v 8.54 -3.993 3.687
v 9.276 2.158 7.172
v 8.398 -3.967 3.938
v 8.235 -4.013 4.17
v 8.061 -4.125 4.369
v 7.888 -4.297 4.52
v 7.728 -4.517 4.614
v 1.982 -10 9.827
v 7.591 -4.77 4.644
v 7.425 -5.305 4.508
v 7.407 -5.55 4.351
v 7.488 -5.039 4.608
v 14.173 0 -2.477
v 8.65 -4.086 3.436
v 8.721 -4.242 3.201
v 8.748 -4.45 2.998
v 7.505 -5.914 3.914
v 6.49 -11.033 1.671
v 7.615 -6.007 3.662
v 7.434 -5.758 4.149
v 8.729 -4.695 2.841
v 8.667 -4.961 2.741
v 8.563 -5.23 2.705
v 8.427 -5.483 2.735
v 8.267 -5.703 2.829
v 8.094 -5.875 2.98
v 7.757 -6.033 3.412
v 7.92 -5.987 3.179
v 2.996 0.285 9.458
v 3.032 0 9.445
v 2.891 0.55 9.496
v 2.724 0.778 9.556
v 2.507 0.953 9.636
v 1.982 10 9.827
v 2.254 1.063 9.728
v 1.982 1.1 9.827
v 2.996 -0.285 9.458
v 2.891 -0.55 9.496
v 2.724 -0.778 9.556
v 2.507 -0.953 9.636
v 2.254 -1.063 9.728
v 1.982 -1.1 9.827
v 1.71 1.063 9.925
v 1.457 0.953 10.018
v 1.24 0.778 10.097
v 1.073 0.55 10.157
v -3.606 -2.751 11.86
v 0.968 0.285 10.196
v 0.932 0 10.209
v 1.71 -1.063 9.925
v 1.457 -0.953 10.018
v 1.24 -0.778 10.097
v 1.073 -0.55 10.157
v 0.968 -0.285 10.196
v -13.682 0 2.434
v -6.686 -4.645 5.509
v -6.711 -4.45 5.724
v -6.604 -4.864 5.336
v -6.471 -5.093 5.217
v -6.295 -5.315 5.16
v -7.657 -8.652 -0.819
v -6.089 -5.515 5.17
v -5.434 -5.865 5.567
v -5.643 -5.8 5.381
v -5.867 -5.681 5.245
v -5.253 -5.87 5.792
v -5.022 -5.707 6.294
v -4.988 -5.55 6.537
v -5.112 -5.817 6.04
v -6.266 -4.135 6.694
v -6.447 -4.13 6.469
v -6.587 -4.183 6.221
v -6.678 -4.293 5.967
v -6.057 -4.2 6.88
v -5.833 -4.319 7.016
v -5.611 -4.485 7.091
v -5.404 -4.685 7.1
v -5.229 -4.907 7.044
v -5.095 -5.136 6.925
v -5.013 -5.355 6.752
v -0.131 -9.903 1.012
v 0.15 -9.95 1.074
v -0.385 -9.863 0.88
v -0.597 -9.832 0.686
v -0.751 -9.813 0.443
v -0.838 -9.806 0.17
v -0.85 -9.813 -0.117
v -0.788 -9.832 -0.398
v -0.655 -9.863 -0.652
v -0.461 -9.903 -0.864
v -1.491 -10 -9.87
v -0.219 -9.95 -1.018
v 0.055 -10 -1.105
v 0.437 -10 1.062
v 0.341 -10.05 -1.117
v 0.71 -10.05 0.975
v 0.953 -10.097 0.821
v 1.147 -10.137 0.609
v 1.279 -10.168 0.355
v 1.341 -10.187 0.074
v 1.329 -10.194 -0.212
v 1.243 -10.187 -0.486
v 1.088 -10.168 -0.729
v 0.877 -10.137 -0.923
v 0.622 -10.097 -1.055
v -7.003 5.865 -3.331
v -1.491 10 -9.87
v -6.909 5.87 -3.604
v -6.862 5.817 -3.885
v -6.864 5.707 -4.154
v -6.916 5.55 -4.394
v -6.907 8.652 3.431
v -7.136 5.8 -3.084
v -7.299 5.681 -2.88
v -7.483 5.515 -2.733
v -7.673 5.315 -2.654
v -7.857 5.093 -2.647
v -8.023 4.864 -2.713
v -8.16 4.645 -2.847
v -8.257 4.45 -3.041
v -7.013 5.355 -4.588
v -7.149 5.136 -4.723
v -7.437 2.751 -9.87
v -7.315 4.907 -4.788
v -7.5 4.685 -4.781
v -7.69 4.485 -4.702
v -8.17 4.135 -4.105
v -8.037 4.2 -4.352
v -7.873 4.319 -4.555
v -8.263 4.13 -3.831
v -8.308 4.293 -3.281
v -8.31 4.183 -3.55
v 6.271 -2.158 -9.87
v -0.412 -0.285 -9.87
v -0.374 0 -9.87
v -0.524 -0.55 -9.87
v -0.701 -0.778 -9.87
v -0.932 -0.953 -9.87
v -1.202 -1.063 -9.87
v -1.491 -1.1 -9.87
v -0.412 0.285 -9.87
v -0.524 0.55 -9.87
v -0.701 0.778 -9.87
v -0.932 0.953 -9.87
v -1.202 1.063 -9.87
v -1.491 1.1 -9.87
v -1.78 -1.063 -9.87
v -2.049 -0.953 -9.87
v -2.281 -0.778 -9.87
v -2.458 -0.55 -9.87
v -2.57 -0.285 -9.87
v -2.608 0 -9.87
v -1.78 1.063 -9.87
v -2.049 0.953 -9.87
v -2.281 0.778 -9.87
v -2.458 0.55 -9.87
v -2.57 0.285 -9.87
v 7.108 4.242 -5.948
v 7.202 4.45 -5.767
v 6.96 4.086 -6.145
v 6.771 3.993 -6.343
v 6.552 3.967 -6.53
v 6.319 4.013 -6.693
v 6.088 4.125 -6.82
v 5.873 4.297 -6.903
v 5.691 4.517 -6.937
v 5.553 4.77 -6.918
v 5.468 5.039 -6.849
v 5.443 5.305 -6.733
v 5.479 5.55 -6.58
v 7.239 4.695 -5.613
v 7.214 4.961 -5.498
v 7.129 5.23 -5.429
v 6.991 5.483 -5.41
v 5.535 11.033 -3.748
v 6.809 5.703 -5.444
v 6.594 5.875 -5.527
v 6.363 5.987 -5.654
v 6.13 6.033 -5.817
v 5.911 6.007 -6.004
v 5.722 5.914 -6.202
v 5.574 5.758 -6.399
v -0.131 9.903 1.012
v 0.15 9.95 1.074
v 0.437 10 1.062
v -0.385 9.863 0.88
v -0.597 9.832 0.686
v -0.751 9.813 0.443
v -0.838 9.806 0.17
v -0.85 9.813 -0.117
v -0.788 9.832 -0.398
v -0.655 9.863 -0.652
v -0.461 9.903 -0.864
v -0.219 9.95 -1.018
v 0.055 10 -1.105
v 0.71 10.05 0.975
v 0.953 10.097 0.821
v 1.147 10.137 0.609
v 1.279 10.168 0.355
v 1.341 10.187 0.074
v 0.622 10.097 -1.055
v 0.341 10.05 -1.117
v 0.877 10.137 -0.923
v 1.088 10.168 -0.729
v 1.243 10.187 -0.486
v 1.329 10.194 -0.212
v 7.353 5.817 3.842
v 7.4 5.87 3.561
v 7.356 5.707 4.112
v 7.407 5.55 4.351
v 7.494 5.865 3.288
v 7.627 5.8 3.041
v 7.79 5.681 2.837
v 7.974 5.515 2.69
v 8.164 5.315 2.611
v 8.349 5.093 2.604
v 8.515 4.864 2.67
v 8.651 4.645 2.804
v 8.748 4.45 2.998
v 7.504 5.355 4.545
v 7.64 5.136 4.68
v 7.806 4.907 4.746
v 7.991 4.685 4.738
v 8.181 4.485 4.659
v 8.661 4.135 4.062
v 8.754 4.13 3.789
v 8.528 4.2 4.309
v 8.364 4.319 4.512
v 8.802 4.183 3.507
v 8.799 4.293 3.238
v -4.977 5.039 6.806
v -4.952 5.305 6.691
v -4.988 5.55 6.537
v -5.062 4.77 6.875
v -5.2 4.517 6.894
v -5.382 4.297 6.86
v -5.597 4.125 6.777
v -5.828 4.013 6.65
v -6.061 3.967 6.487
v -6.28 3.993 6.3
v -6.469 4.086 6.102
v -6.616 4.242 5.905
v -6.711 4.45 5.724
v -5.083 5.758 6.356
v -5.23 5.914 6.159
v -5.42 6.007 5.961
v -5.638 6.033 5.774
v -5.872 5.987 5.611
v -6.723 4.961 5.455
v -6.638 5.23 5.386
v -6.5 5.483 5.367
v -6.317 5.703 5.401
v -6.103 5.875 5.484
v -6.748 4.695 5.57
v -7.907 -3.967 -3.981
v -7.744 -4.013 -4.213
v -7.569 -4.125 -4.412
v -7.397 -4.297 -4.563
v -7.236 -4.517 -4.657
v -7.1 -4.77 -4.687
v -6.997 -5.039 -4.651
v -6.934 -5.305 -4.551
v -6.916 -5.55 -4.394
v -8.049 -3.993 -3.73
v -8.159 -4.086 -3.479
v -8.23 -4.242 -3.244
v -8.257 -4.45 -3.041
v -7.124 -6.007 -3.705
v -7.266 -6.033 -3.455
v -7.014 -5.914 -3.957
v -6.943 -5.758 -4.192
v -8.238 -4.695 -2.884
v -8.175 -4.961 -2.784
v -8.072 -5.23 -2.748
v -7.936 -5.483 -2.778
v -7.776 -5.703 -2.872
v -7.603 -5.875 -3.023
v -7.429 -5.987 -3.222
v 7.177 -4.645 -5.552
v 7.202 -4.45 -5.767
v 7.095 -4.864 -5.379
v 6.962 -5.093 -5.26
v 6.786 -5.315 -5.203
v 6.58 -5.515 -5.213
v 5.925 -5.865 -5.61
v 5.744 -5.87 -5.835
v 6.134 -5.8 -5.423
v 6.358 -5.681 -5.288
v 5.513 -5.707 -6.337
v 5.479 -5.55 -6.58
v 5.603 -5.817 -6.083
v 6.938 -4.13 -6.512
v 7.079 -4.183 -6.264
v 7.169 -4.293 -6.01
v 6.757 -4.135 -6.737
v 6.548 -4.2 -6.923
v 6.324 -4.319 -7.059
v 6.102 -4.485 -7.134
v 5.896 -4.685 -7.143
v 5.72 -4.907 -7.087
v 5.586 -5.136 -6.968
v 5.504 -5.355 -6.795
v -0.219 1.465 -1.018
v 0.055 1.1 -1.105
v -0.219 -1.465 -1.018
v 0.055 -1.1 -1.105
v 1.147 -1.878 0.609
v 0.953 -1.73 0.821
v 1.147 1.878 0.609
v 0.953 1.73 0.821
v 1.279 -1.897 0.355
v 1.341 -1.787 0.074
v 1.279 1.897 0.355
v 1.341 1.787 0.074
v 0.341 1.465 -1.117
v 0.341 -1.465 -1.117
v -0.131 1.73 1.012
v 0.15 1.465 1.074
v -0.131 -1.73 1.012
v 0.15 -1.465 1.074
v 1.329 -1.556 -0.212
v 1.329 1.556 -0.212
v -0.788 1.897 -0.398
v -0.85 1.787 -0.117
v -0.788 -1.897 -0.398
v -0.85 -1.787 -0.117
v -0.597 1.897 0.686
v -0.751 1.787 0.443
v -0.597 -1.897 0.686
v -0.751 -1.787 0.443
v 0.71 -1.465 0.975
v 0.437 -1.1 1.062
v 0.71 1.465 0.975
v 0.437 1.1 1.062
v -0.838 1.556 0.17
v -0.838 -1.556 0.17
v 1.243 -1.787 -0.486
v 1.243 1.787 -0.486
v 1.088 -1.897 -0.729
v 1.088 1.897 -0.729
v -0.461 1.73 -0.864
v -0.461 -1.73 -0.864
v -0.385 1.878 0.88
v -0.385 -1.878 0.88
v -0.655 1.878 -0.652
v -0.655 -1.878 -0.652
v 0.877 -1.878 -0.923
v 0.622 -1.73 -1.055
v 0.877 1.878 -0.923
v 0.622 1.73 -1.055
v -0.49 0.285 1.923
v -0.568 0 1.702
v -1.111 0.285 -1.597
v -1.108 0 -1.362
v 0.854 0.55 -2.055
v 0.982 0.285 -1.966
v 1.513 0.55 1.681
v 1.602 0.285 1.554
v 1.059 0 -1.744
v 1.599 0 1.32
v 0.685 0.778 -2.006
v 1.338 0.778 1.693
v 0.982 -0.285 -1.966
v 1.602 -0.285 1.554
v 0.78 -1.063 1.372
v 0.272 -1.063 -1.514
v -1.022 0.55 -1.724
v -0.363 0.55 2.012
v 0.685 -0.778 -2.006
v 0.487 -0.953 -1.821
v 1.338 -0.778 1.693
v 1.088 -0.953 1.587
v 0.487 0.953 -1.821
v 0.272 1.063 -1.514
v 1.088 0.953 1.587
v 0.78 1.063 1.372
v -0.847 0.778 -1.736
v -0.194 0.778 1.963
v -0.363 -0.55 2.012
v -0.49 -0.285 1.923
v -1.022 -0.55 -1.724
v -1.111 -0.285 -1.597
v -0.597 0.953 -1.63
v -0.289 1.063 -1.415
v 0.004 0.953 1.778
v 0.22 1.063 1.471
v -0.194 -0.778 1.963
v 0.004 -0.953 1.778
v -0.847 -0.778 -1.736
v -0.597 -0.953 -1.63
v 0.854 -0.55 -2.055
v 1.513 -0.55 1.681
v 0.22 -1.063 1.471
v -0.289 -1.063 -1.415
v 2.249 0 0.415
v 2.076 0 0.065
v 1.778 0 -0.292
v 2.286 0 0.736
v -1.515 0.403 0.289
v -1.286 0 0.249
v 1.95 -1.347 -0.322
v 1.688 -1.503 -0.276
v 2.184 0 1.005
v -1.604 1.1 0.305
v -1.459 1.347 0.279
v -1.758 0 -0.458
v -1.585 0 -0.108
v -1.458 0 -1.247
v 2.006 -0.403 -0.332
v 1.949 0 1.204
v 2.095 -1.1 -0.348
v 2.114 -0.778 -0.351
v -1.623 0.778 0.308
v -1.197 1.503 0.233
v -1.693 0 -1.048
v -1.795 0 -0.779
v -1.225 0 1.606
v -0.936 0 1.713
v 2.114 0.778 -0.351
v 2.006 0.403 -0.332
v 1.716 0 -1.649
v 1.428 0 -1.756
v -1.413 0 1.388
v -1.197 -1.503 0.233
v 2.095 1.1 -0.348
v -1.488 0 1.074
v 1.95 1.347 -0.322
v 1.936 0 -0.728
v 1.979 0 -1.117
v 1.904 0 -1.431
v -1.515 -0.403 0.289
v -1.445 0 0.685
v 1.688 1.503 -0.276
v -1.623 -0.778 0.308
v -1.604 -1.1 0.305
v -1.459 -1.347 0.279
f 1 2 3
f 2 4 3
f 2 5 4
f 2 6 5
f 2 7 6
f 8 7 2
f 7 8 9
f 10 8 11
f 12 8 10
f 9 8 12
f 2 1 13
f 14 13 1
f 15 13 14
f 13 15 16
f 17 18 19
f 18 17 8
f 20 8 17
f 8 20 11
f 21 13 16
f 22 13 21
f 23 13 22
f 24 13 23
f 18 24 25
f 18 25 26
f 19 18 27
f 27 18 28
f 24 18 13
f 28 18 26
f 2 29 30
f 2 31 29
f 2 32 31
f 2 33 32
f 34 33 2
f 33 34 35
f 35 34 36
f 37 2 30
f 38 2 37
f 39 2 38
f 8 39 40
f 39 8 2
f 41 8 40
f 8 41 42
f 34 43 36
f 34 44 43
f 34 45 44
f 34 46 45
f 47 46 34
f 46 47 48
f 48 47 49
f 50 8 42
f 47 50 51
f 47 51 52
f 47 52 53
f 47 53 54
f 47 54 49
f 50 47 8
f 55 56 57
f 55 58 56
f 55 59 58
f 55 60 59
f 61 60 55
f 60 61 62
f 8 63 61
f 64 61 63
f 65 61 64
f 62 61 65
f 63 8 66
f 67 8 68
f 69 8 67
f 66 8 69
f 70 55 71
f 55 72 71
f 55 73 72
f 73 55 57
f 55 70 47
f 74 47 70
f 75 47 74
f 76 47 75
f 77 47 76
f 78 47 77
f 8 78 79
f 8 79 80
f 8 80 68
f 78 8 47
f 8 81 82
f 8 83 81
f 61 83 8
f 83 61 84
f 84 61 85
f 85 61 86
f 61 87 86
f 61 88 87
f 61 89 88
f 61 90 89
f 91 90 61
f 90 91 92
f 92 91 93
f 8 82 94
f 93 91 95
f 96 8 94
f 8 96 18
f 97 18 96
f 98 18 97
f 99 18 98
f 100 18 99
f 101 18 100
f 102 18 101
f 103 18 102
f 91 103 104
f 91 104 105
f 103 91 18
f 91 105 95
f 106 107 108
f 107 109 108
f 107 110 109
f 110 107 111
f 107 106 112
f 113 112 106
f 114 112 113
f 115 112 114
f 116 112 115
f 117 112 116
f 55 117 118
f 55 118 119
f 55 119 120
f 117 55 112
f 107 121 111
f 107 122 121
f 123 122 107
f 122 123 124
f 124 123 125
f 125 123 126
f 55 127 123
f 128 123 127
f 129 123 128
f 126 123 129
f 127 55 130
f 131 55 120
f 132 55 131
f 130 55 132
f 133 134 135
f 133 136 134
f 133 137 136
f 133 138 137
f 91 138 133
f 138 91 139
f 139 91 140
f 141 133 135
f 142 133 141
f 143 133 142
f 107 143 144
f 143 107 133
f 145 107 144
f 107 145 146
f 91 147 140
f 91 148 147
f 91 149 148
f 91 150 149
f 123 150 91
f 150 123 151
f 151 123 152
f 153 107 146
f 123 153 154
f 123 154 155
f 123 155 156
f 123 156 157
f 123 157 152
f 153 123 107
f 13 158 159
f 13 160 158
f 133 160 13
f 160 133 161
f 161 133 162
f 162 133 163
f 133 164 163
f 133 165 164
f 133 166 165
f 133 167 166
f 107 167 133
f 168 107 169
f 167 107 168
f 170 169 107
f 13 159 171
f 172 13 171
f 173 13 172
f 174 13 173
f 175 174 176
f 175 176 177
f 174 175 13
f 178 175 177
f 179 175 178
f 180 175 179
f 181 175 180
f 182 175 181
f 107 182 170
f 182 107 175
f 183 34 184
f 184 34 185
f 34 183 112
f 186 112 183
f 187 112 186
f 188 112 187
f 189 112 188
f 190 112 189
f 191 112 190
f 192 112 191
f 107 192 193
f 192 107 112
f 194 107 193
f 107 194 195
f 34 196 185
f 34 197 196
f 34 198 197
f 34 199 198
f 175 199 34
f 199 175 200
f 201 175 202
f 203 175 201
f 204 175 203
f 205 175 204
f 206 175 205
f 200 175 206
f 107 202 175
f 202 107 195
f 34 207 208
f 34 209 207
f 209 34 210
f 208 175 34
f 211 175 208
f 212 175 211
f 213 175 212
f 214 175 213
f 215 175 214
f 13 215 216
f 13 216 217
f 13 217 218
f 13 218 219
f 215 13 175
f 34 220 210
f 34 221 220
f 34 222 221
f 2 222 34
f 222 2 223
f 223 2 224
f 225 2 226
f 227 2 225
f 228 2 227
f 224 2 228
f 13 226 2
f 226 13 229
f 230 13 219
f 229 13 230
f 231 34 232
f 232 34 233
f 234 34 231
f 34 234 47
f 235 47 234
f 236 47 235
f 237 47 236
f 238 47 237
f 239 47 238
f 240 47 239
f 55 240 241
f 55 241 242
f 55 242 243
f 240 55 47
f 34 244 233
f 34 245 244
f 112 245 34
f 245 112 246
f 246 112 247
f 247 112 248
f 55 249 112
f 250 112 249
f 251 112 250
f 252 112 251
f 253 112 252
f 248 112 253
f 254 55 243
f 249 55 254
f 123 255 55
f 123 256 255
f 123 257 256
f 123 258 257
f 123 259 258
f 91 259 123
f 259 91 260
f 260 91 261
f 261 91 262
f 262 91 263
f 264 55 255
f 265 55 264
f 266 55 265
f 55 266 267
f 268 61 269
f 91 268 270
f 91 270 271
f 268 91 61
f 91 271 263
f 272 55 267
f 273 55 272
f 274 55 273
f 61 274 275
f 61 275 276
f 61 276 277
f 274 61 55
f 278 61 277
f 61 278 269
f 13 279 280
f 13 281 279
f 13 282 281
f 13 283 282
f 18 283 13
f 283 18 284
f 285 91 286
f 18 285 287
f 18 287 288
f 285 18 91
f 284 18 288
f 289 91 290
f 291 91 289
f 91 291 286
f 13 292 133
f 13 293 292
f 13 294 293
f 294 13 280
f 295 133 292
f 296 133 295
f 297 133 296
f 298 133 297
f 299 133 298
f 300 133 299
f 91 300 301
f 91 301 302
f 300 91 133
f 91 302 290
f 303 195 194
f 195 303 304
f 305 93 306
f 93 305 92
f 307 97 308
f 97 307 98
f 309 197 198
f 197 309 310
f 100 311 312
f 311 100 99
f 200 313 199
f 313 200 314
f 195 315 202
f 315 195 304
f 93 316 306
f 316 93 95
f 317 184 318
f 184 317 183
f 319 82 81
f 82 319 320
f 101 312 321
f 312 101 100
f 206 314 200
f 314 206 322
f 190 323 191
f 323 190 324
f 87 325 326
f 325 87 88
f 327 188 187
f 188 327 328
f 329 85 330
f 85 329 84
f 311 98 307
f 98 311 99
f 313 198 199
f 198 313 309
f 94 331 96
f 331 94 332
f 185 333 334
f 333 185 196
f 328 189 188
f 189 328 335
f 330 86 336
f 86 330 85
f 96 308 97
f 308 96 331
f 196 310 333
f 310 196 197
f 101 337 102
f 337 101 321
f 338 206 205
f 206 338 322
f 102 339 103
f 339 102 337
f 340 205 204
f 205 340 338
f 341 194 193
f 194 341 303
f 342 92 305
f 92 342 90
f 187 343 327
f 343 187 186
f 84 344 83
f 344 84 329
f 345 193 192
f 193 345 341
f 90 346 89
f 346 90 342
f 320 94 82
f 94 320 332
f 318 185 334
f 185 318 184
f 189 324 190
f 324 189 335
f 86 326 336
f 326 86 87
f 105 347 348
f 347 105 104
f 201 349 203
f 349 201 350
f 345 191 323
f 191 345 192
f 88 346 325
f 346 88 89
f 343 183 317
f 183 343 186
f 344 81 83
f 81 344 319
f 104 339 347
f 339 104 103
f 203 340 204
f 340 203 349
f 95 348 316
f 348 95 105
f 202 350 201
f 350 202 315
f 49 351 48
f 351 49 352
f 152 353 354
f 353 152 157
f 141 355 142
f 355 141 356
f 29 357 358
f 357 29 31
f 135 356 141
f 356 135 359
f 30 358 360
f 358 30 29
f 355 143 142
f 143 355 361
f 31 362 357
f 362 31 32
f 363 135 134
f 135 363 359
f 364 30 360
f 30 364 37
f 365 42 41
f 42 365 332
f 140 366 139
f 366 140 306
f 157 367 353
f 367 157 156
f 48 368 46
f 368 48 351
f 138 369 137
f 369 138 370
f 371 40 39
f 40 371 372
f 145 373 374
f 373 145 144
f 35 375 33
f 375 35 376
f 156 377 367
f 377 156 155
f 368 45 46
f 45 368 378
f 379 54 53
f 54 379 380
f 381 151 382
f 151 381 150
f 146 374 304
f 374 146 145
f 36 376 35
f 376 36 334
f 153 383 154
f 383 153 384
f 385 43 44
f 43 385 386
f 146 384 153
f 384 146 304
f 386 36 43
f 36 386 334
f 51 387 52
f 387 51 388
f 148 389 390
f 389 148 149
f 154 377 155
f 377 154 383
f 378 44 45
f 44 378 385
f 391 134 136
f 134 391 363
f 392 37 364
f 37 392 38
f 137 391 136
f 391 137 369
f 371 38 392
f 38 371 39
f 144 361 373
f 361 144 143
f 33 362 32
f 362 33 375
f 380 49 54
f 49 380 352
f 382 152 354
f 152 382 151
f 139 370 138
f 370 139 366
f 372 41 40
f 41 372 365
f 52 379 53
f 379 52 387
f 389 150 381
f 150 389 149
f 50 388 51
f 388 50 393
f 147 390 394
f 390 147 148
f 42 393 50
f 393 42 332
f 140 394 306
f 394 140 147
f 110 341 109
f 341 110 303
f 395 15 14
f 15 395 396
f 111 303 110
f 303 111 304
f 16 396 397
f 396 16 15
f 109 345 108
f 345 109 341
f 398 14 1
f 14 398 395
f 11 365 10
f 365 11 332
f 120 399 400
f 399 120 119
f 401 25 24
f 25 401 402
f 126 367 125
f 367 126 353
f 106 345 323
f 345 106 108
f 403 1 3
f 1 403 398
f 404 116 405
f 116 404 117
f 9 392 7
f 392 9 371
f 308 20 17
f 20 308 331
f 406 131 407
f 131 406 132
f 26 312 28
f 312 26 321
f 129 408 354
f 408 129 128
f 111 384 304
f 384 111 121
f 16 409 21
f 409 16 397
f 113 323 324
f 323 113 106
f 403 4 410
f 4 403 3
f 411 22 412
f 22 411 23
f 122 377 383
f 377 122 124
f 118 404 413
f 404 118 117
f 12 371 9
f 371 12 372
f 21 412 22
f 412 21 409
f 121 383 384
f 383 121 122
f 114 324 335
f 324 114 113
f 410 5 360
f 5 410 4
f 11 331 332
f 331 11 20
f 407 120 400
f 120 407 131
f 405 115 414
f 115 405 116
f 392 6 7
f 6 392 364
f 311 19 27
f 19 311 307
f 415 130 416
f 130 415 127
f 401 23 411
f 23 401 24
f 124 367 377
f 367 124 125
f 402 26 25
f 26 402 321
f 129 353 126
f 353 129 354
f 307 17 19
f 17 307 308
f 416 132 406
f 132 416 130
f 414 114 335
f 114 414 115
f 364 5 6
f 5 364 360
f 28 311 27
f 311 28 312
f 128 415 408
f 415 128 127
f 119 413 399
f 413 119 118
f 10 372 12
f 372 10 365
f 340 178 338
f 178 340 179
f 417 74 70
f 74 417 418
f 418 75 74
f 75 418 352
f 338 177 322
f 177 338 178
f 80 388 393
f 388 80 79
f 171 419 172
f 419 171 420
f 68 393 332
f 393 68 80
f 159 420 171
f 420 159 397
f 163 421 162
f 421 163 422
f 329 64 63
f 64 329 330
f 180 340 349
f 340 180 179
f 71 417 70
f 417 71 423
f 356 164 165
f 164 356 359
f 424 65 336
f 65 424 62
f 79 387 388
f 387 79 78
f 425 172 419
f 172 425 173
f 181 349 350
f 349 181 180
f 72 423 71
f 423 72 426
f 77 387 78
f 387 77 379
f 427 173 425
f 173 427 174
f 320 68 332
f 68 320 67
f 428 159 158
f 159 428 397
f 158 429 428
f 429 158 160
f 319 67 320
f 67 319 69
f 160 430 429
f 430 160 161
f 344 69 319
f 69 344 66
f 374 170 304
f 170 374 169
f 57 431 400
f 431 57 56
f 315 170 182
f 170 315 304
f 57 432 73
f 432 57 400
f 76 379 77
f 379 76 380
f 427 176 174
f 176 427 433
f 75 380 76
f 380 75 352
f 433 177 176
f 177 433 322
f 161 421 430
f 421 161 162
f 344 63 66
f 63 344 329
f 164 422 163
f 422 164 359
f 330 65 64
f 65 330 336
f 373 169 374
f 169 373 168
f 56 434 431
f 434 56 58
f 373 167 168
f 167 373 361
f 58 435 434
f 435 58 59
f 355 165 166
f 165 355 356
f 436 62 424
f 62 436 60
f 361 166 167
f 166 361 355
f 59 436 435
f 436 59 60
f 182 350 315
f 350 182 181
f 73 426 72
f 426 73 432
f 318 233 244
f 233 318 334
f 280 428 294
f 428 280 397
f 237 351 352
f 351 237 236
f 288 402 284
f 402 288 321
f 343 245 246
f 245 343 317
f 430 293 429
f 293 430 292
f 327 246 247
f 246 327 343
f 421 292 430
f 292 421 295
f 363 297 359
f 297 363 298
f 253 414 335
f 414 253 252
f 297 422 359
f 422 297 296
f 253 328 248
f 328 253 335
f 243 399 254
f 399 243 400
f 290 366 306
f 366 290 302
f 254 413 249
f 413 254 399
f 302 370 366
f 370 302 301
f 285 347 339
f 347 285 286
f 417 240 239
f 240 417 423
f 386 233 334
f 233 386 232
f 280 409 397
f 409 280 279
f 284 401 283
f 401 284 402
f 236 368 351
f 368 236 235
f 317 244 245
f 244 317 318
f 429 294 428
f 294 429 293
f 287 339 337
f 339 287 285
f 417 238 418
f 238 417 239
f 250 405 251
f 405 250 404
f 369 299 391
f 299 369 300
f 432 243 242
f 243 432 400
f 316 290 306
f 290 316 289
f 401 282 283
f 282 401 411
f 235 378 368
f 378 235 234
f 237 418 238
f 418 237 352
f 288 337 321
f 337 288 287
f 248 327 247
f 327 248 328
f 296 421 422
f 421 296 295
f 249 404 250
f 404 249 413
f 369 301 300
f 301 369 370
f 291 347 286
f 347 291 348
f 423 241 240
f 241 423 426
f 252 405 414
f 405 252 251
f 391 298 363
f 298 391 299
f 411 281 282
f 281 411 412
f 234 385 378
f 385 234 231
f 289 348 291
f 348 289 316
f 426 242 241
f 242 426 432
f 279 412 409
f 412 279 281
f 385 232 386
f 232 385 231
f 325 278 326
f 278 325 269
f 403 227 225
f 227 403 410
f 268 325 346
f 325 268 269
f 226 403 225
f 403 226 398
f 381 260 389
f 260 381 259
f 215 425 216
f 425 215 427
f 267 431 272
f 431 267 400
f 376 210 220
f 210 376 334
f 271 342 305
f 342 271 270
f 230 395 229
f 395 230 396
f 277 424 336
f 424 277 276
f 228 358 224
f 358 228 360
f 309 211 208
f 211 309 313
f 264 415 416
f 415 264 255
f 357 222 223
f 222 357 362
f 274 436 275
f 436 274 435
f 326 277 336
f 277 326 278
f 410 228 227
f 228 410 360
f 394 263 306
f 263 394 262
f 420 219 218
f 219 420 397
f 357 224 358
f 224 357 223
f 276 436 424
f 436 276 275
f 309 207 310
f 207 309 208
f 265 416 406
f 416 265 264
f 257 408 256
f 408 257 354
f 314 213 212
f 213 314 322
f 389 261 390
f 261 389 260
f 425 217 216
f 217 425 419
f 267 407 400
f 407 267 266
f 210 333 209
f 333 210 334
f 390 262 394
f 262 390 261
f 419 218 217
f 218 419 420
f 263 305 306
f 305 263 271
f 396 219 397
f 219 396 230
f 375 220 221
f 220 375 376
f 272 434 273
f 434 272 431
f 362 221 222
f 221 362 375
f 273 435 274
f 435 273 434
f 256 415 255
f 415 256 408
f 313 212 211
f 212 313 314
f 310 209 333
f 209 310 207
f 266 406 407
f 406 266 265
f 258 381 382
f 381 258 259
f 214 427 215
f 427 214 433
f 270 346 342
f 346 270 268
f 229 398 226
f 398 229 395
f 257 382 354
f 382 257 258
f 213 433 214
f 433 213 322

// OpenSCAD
//Шаг сетки для решётки из ромбододекаэдров (межцентровое расстояние)
MM_GRID_STEP = 20.0;

//диаметр отвертия (диаметр описанной окружности около многоугольника детализации)
//если диаметр = 0, то отверстий нет, 2.2 = диаметр зубочистки
MM_HOLE_DIAMETER = 2.2;

//true либо false параметр, показывающия исходный ромбододекаэдр без скоса
//для подсветки и разработки делай true, для 3Д-печати делай false
WILL_SHOW_CORE = false;

//показывать цвета
WILL_SHOW_COLOR = true;

//длина укороченной чёрной стороны (когда 1 - ось поворта по короткой диагонали)
//ось поворота - это граница цветов 
//синее море внизу и белое небо сверху на видео от Певницкого 15 мая
CUT_RATIO = 1;
//синее море внизу и белое небо сверху, если угол положительный
CUT_DEGREE = 10;

//такой n-угольник для детализации отверстия
HOLE_DETALISATION_IS_N_POLYGON = 24;


CUBE_SIDE = MM_GRID_STEP / sqrt(2);

//тетраэдр по четырём точкам, точка номер ноль - вершина
module m_tetrahedron(p4) {
    polyhedron(points=p4, faces=[[0,1,2],[0,2,3],[0,3,1],[3,2,1]]);
}

//пирамида с четырёхугольноком в основании, точка номер ноль - вершина
module m_p5_pyramid(p5) {
    polyhedron(points=p5, faces=[[0,1,2],[0,2,3],[0,3,4],[0,4,1],[4,3,2,1]]);
}

module m_p4_p5(p4_or_p5) {
    if (len(p4_or_p5) == 4) {m_tetrahedron(p4_or_p5);} else {m_p5_pyramid(p4_or_p5);}
}

//интерполирование по прямой с точками р0(ноль) и р1(один) любым вещественным числом
//массивы (три координаты) тоже можно складывать и умножать на число
function f_n01(p0, p1, n01) = ((p1 - p0) * n01) + p0;

//сумма массива с любым числом точек (рекурсивно)
function f_sum_recursion(array_p, my_result, i) =
    ((i>=len(array_p)) ?
        my_result :
        f_sum_recursion(array_p, my_result + array_p[i], i+1));

//сумма векторов, array_p[0] * 0 - нужно, чтобы получить необходимое число нулей [0,0,0]
function f_sum(array_p) = f_sum_recursion(array_p, array_p[0] * 0, 0);

//центр массива точек
function f_center(array_p) = f_sum(array_p) * (1 / len(array_p));

//синтаксис для переменных (в том числе, функциональных переменных)
function f_three_or_four_points_extend(p3_or_p4, my_scale = 1) =
    let (c = f_center(p3_or_p4))
    let (f = function (i) f_n01(c, p3_or_p4[i], my_scale))
(len(p3_or_p4)==3) ? [f(0), f(1), f(2)] : [f(0), f(1), f(2), f(3)];


function f_half_space(p3_or_p4, scale_triangle = 1, scale_pyramyd_ratio = 1) = 
    let (p3_or_p4 = f_three_or_four_points_extend(p3_or_p4, scale_triangle))
    let (scale_to_apex = scale_triangle * scale_pyramyd_ratio)
    let (p_apex = f_n01(f_center(p3_or_p4), [0,0,0], scale_to_apex))
    let (arr_3 = [p_apex, p3_or_p4[0], p3_or_p4[1], p3_or_p4[2]])
    let (arr_4 = [p_apex, p3_or_p4[0], p3_or_p4[1], p3_or_p4[2], p3_or_p4[3]])
(len(p3_or_p4)==3) ? arr_3 : arr_4;

PX = [2,0,0]; PY = [0,2,0]; PZ = [0,0,2]; MX = [-2,0,0]; MY = [0,-2,0]; MZ = [0,0,-2];
CX = [1,-1,-1]; CY = [-1,1,-1]; CZ = [-1,-1,1]; 
CXY = [1,1,-1]; CYZ = [-1,1,1]; CXZ = [1,-1,1];
CXYZ = [1,1,1]; CMMM = [-1,-1,-1];

//вершины граней против часовой стрелки, если смотреть снаружи
face_0 = [PX, CXZ, PZ, CXYZ]; tip_0 = 1;
face_1 = [PZ, CYZ, PY, CXYZ]; tip_1 = 1;
face_2 = [MX, CYZ, PZ, CZ]; tip_2 = 1;
face_3 = [PZ, CXZ, MY, CZ]; tip_3 = 1;

face_4 = [MX, CMMM, MZ, CY]; tip_4 = 1;
face_5 = [MZ, CMMM, MY, CX]; tip_5 = 1;
face_6 = [PX, CXY, MZ, CX]; tip_6 = 1;
face_7 = [MZ, CXY, PY, CY]; tip_7 = 1;

face_8 = [PY, CXY, PX, CXYZ]; tip_8 = 3;
face_9 = [PY, CYZ, MX, CY]; tip_9 = 3;
face_10 = [MY, CMMM, MX, CZ]; tip_10 = 3;
face_11 = [MY, CXZ, PX, CX]; tip_11 = 3;

tip_indexes_all = [tip_0, tip_1, tip_2, tip_3, tip_4, tip_5, tip_6, tip_7, tip_8, tip_9, tip_10, tip_11];
face_all = [face_0, face_1, face_2, face_3, face_4, face_5, face_6, face_7, face_8, face_9, face_10, face_11];
function f_face_i12_i4(i12, i4) = face_all[i12][(i4 + 4 - tip_indexes_all[i12]) % 4];
function f_face_i12(i) = [f_face_i12_i4(i,0), f_face_i12_i4(i,1), f_face_i12_i4(i,2), f_face_i12_i4(i,3)];

module m_face(i_face, scale_triangle = 1, scale_pyramyd_ratio = 1) {
    p4 = f_face_i12(i_face);
    
    p_rhombus = [p4[0], p4[1], p4[2], p4[3]];
    
    m_p4_p5(f_half_space(p_rhombus, scale_triangle, scale_pyramyd_ratio)); 
}

function f_axis(p4, my_ratio = CUT_RATIO) = [f_n01(p4[0], p4[1], my_ratio), f_n01(p4[2], p4[3], my_ratio)];

module m_my_rotation_on_axis(i_face, a_deg = CUT_DEGREE, my_ratio = CUT_RATIO) {
    ab = f_axis(f_face_i12(i_face), my_ratio);
    translate(ab[1])
        rotate(a = a_deg, v = ab[1] - ab[0])
            translate(ab[1] * (-1))
                children();
} 
 
module m_rotated_face(i_face, a_deg = CUT_DEGREE, my_ratio = CUT_RATIO) {
    m_my_rotation_on_axis(i_face, a_deg, my_ratio)
        m_face(i_face, 8, 1);
}

ARR_COLORS = 
[[0.5,0,0],[0.5,0,0],[0.5,0,0],[0.5,0,0],
[0,0.5,0],[0,0.5,0],[0,0.5,0],[0,0.5,0],
[1,1,0],[1,1,0],[1,1,0],[1,1,0]];

module m_12_faces(will_show_not_rotated_core = WILL_SHOW_CORE, cut_ratio = CUT_RATIO, cut_degree = CUT_DEGREE) {
    intersection_for(n = [0 : 11]){
        if (WILL_SHOW_COLOR) {
            color(ARR_COLORS[n])
                hull() m_rotated_face(n, cut_degree, cut_ratio);
        }
        else
            hull() m_rotated_face(n, cut_degree, cut_ratio);
    }
    
    if (will_show_not_rotated_core)
    #rotate(0){
        m_face(0);m_face(1);m_face(2);m_face(3);
        m_face(4);m_face(5); m_face(6);m_face(7);
        m_face(8);m_face(9);m_face(10);m_face(11);
    }
}


module m_cylinder(rotate_axe=[0,0,1], rotate_deg=45, d=MM_HOLE_DIAMETER, half_h=(MM_GRID_STEP * 0.5) * 4.2) {
    rotate (a=rotate_deg, v=rotate_axe)
        cylinder(h=half_h*2, d=d, center=true, $fn=HOLE_DETALISATION_IS_N_POLYGON);
}

module m_all_cylinders() {
    if (MM_HOLE_DIAMETER > 0) {
        m_cylinder([+1,0,0], +45); m_cylinder([+1,0,0], -45); 
        m_cylinder([0,+1,0], +45); m_cylinder([0,+1,0], -45);
        m_cylinder([+1,+1,0], 90); m_cylinder([+1,-1,0], 90);
    }
}

module m_final(cut_ratio, cut_degree, xyz_n_step = [0,0,0], show_core = WILL_SHOW_CORE) {
    translate(v = xyz_n_step * MM_GRID_STEP)    
        rotate(a = 45, v=[1,0,0])
            m_my_rotation_on_axis(5, -CUT_DEGREE)
            difference () {
                scale (CUBE_SIDE / 2) m_12_faces(show_core, cut_ratio, cut_degree);
                m_all_cylinders();
            }
}

//[1.0 - 0.75], [45 - 15]
//m_final(1 - (1-$t) * 0.25 * 0, 0 + $t*45);

m_final(CUT_RATIO, CUT_DEGREE);
